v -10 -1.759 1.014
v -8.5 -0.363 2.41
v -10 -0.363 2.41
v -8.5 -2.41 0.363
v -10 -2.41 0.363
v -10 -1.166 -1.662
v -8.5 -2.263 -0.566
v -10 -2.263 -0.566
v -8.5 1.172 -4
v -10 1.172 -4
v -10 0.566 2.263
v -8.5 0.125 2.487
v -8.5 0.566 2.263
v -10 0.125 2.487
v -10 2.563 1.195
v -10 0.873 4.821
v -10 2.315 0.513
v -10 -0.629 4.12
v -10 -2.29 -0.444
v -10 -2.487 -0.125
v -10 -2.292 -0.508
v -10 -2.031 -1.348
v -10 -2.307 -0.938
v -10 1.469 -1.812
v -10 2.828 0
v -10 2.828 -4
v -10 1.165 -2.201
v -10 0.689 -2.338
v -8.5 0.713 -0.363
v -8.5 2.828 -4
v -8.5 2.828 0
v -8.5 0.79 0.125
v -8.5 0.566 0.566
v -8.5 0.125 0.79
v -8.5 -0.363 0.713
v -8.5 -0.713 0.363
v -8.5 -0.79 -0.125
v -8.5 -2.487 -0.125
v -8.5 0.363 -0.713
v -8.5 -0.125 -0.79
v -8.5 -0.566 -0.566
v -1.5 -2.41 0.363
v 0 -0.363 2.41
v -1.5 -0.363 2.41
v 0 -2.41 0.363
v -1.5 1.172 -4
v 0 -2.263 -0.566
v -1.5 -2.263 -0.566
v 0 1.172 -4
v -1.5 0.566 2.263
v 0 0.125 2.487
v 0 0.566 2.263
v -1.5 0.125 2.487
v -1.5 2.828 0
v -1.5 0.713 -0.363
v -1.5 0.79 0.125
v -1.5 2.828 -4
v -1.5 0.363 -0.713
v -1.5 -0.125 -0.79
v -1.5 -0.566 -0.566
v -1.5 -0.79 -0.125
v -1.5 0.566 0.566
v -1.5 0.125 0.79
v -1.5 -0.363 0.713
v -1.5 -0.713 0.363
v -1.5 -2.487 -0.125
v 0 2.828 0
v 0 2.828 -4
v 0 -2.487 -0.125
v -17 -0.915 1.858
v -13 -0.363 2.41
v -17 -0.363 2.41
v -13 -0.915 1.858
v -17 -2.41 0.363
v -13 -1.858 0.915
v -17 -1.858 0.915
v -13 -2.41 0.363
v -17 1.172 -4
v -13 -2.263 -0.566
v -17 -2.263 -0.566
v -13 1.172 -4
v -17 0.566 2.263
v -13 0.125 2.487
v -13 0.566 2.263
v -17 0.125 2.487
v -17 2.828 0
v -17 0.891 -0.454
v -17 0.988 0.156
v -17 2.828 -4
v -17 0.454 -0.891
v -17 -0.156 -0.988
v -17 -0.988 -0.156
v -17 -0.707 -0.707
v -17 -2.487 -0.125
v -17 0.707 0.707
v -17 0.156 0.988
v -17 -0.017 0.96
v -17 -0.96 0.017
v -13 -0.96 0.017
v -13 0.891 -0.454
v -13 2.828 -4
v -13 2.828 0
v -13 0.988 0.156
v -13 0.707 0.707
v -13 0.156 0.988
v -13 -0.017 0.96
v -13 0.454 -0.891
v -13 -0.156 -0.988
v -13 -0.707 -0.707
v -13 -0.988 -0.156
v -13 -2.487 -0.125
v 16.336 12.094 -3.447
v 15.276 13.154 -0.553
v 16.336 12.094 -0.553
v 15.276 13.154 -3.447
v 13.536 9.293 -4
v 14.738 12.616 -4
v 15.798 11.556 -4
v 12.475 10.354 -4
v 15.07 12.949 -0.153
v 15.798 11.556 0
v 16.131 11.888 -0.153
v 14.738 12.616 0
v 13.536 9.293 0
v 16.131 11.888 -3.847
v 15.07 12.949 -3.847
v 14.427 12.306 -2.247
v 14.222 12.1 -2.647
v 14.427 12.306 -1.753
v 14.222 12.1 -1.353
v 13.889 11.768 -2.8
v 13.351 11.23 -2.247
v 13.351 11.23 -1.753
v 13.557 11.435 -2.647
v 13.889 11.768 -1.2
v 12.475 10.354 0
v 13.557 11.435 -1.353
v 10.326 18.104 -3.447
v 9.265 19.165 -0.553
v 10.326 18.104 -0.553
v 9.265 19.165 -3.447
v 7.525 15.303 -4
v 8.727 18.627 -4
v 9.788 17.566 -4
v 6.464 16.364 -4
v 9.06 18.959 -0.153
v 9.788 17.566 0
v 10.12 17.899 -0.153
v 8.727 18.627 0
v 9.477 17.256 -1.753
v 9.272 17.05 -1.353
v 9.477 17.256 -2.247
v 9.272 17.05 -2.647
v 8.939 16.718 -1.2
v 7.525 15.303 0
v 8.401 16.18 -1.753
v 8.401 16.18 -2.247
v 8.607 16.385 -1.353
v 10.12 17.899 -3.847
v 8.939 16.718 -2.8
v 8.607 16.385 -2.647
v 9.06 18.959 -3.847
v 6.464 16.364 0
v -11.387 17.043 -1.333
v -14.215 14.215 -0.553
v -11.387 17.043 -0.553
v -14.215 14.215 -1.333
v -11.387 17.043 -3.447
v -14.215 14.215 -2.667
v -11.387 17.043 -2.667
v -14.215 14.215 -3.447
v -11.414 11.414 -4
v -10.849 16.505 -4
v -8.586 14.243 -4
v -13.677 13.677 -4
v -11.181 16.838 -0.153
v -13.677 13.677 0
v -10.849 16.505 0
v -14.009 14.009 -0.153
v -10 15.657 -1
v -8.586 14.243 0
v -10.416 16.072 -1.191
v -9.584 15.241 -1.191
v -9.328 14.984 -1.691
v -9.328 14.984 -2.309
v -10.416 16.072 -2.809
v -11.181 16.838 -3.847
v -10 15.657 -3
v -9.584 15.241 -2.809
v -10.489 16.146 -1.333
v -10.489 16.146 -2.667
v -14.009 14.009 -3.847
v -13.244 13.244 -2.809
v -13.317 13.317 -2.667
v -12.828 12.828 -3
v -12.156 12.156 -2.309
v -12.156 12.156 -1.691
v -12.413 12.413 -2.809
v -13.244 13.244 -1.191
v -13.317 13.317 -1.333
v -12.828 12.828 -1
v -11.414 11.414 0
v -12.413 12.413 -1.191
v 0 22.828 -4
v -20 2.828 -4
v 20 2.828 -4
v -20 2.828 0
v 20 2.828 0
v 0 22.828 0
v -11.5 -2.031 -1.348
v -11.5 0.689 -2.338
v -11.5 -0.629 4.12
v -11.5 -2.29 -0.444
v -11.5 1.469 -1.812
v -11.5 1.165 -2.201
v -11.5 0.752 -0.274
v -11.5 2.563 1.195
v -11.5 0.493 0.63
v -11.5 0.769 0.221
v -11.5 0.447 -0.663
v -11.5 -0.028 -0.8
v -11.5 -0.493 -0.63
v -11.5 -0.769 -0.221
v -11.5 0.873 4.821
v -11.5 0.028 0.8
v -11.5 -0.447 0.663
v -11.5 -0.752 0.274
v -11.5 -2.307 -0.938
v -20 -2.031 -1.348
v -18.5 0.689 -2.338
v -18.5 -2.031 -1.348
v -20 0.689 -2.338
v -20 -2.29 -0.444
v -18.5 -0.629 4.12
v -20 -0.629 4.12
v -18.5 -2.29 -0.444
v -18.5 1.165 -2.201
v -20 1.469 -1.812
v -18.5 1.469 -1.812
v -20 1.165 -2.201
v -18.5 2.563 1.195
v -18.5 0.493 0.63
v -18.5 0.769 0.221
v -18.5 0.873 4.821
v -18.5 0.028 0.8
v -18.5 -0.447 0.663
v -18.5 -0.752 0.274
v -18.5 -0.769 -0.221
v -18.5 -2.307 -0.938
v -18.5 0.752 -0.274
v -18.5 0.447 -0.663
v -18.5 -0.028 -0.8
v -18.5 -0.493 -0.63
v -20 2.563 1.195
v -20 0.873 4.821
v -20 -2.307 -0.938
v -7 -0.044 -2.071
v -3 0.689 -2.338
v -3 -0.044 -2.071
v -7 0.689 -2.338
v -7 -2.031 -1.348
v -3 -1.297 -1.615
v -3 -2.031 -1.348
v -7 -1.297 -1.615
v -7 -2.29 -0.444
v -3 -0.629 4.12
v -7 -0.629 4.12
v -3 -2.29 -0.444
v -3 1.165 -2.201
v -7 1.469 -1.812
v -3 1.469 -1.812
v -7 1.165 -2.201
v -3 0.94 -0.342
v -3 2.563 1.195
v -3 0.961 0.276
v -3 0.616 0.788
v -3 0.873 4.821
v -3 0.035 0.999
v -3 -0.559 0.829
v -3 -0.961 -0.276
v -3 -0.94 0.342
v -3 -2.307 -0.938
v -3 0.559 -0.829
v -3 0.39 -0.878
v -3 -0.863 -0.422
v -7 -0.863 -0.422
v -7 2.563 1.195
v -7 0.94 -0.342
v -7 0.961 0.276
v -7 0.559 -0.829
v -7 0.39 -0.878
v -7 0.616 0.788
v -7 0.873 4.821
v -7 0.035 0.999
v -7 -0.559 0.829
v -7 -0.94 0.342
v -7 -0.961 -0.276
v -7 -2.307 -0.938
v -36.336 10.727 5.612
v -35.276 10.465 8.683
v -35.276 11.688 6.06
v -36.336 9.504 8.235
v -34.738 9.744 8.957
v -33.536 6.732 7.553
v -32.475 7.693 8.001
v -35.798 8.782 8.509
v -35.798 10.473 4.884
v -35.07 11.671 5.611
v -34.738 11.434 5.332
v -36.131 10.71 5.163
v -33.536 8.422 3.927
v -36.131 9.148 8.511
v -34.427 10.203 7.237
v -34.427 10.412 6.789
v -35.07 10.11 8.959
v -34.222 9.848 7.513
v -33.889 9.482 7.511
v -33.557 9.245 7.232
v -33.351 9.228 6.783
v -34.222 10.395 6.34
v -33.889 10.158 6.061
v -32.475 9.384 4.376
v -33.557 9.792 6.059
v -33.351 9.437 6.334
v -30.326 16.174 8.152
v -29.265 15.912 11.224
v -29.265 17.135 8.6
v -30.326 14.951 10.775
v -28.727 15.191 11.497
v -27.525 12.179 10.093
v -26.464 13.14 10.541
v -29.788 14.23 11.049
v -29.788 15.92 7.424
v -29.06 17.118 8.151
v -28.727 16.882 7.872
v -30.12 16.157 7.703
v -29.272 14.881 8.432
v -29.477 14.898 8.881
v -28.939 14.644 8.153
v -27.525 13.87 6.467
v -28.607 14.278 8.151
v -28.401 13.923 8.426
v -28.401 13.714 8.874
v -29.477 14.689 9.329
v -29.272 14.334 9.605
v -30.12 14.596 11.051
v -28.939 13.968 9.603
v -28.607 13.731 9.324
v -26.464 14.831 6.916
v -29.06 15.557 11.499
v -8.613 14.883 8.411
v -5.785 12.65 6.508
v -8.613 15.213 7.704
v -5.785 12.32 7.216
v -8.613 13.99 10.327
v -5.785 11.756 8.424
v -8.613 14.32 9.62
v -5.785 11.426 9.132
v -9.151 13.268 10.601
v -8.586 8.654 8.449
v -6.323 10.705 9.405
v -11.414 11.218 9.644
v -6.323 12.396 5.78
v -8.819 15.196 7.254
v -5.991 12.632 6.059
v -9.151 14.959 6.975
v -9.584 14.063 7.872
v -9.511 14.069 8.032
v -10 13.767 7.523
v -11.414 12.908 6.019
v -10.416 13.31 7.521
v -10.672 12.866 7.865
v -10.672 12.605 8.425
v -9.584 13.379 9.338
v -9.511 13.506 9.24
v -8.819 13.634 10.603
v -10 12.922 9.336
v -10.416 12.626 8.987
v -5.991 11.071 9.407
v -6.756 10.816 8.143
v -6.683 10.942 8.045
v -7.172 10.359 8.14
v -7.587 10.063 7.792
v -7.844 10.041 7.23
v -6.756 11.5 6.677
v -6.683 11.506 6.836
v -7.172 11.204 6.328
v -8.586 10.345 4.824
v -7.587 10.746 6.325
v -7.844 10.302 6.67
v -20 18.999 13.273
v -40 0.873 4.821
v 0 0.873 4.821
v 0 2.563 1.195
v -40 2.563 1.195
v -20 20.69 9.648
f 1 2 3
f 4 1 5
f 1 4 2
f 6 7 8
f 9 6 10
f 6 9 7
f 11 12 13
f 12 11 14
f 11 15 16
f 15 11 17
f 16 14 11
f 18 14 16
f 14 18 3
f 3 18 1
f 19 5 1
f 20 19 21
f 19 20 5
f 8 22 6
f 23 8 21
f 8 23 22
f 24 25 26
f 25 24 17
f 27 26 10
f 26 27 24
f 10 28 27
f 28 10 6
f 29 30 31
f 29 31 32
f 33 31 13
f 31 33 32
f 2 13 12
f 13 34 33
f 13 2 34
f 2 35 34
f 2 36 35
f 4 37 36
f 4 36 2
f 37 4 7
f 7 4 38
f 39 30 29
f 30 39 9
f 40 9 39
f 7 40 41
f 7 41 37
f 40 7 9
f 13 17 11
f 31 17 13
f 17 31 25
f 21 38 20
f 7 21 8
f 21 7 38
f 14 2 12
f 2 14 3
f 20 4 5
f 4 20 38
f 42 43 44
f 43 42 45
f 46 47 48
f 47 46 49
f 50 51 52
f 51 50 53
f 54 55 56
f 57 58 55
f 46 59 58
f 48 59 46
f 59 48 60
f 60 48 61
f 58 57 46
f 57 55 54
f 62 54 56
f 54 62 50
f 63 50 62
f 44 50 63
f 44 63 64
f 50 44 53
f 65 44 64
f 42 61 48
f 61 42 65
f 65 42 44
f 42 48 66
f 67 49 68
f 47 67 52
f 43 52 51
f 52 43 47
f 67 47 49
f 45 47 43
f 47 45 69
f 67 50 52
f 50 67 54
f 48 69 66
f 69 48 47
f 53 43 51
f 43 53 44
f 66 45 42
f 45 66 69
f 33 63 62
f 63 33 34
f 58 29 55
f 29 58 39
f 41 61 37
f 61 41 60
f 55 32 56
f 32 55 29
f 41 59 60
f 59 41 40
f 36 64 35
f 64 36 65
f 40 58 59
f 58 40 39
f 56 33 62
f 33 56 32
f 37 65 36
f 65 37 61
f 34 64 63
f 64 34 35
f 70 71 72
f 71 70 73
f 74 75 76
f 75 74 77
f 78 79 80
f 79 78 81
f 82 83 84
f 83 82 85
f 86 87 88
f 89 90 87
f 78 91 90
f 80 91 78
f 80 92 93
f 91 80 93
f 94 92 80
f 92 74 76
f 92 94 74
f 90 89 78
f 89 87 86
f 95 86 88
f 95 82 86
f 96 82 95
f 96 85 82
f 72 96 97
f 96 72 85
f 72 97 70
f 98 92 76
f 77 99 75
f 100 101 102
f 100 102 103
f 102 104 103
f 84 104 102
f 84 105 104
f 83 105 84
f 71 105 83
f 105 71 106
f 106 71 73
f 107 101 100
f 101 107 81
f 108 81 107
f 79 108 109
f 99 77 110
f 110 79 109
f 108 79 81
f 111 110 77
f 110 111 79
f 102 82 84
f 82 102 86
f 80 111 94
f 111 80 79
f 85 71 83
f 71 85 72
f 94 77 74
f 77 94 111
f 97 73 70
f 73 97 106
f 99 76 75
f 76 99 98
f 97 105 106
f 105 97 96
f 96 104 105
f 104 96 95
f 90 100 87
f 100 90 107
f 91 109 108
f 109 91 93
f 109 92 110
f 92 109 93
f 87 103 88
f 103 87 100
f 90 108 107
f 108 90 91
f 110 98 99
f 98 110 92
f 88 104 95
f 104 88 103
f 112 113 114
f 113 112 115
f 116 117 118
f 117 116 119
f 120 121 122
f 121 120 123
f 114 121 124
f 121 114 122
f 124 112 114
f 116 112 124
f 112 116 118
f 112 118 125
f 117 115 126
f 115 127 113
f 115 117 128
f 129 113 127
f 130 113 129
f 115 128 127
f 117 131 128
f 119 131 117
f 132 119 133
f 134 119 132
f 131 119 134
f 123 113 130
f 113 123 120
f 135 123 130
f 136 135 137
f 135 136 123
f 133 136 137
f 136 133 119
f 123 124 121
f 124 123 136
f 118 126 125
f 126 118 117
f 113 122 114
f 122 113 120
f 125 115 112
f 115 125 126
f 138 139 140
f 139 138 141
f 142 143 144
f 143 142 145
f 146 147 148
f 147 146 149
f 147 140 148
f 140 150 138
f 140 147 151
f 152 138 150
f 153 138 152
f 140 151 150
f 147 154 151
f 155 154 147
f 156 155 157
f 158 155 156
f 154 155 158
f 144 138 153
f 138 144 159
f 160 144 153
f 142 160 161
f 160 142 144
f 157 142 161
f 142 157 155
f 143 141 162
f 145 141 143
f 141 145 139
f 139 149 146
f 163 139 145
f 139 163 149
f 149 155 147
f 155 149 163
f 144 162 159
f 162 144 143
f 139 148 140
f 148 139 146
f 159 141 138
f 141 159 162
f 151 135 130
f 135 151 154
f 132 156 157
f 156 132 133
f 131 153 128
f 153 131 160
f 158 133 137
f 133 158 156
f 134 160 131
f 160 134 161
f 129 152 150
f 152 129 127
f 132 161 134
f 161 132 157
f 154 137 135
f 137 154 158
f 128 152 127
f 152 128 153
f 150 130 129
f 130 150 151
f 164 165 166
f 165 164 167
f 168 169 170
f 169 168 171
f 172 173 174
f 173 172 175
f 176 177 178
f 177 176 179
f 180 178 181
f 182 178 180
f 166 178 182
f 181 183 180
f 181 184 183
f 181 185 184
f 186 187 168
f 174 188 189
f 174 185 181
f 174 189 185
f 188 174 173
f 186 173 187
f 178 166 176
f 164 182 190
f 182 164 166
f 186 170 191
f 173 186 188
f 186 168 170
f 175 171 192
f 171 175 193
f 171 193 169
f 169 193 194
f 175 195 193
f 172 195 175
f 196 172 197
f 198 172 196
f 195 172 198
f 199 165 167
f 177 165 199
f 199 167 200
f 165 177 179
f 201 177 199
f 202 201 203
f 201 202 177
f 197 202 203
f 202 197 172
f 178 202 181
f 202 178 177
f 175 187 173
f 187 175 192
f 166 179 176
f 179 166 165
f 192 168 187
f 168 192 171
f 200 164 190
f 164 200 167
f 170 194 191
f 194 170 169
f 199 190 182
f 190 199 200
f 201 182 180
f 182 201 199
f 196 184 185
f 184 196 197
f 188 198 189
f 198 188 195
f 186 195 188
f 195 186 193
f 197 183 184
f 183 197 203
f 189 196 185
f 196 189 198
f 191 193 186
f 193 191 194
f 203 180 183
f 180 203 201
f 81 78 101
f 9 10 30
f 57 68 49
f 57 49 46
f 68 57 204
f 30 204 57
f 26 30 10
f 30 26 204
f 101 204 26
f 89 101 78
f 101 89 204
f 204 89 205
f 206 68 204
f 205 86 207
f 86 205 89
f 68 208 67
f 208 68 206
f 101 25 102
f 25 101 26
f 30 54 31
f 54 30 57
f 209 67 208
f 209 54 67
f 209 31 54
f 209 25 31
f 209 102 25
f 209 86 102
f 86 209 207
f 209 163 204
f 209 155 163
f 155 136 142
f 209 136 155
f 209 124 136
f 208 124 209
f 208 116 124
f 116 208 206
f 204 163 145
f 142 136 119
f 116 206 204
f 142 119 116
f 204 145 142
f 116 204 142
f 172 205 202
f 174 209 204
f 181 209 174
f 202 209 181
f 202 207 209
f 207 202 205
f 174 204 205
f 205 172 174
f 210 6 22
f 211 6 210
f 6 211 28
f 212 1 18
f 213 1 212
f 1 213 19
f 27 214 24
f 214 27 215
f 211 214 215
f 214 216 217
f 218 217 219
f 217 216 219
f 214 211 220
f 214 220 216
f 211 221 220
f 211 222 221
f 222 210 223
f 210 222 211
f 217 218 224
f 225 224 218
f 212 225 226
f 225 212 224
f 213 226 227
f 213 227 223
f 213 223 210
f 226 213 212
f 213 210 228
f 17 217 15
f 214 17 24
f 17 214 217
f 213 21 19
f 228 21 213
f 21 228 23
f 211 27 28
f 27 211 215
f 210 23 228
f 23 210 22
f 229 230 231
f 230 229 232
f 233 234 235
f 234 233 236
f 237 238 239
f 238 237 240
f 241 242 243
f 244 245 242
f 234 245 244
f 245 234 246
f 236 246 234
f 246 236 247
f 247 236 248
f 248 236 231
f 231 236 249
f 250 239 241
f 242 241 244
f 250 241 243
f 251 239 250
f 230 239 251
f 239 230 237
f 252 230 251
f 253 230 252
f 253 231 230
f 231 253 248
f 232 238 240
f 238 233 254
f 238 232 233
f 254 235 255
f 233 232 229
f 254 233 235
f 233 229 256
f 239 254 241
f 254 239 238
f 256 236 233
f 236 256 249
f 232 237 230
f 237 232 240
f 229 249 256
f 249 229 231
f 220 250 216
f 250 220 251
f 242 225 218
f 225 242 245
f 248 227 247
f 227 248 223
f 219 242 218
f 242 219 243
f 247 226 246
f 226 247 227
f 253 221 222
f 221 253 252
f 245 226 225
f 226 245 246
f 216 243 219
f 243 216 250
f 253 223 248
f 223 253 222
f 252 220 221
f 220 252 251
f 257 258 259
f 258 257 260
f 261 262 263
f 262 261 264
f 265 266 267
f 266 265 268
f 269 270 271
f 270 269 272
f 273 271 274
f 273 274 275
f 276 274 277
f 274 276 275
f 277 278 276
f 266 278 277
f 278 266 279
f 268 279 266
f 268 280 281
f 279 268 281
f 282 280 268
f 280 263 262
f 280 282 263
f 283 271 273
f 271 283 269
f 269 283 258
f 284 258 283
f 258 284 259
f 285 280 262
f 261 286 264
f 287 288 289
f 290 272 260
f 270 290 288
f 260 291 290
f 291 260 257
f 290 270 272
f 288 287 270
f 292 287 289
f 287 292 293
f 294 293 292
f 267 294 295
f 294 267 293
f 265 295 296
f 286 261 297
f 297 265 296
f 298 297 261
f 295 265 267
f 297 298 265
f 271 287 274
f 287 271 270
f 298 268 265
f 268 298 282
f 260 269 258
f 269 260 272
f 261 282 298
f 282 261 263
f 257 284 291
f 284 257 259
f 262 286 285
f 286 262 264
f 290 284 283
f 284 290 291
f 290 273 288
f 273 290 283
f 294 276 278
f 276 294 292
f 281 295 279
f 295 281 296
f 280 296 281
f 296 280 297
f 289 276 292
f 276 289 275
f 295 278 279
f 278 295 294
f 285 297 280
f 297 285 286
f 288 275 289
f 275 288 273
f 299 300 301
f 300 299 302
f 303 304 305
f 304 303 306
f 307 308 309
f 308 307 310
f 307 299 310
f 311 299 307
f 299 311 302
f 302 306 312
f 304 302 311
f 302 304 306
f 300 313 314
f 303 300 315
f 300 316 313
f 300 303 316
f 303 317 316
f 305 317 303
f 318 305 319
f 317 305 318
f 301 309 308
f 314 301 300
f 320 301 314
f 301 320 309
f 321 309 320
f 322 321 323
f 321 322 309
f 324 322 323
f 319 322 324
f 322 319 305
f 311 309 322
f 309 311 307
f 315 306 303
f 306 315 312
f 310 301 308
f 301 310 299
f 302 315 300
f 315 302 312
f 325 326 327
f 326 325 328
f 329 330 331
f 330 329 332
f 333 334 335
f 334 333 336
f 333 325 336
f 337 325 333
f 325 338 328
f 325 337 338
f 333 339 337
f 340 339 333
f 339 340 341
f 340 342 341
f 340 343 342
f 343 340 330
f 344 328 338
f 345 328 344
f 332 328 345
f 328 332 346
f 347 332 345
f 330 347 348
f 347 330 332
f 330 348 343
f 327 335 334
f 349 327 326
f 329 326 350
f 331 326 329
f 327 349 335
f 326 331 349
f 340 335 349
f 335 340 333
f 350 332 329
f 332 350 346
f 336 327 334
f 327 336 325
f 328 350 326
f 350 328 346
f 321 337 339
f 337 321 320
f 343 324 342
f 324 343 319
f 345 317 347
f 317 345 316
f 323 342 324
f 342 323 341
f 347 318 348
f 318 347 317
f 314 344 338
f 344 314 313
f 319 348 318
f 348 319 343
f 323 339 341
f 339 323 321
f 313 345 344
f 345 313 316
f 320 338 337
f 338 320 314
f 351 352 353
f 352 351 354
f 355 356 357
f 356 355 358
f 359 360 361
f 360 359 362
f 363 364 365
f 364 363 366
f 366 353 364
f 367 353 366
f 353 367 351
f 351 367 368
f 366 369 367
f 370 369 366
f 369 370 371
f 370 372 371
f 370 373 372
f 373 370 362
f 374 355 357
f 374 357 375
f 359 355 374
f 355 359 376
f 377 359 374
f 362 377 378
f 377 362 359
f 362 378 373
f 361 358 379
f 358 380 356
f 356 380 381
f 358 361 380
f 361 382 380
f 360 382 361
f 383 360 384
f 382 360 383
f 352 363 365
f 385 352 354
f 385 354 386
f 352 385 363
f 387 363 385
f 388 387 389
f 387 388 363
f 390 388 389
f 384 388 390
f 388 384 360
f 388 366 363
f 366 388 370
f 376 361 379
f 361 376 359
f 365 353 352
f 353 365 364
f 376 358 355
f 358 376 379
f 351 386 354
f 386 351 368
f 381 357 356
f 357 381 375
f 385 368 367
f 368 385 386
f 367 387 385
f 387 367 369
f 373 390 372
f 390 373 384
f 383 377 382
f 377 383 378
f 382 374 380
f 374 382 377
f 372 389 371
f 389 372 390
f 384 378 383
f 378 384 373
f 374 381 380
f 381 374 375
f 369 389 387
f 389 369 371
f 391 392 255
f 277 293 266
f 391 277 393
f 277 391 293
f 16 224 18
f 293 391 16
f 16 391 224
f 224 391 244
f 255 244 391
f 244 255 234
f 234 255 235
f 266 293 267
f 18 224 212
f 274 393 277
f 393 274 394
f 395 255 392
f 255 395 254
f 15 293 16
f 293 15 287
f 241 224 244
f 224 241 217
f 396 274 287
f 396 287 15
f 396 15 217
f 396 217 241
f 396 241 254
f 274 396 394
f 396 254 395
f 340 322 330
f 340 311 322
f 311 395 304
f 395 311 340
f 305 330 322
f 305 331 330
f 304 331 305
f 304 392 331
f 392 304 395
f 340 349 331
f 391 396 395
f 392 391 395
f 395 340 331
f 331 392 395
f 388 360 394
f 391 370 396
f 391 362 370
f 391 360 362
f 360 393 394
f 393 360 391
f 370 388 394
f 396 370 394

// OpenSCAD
// file: clip.scad
include <vars.scad>;

module clip(){
  width = TRIANGLE_SIDE/4;
  size = TRIANGLE_THICKNESS;
  corner = 0.8;
    
  difference() {
    hull() {
      translate([0, size, 0]) {
        cube([size, size, size], center=true);
      }
      translate([0, -size/2+corner, size/2-corner]) {
        rotate(90, [0,1,0]) {
          cylinder(h=size, r=corner, center=true);
        }
      }
      translate([0, -size/2+corner, -size/2+corner]) {
        rotate(90, [0,1,0]) {
          cylinder(h=size, r=corner, center=true);
        }
      }
    }
    translate([0, -size/2, 0]) {
      cube([width*0.9, size, size/3], center=true);
    }
    rotate(90, [0,1,0]) {
      cylinder(h=width*0.9, r=size/2*1/2, center=true);
    }
  }
}

clip();
// file: hinge.scad
include <vars.scad>;

module hinge(){
  width = TRIANGLE_SIDE/4;
  size = TRIANGLE_THICKNESS;
  side = width/6*0.9;
  corner = 0.8;
    
  hull() {
    translate([-(width/2)+side/2, side*2, 0]) {
      cube([side, size, size], center=true);
    }
    translate([-(width/2)+side/2, -size/2+corner, size/2-corner]) {
      rotate(90, [0,1,0]) {
        cylinder(h=side, r=corner, center=true);
      }
    }
    translate([-(width/2)+side/2, -size/2+corner, -size/2+corner]) {
      rotate(90, [0,1,0]) {
        cylinder(h=side, r=corner, center=true);
      }
    }
  }
  hull() {
    translate([width/2-side/2, side*2, 0]) {
      cube([side, size, size], center=true);
    } 
    translate([width/2-side/2, -size/2+corner, size/2-corner]) {
      rotate(90, [0,1,0]) {
        cylinder(h=side, r=corner, center=true);
      }
    }
    translate([width/2-side/2, -size/2+corner, -size/2+corner]) {
      rotate(90, [0,1,0]) {
        cylinder(h=side, r=corner, center=true);
      }
    }
  }
  rotate(90, [0,1,0]) {
    cylinder(h=width, r=size/2*0.8/2, center=true);
  }
} 

hinge();
// file: triangle.scad
include <vars.scad>;

module triangle(){
  translate([0, 0, -TRIANGLE_THICKNESS/2]) {
    linear_extrude(TRIANGLE_THICKNESS) {
      polygon([[-TRIANGLE_SIDE/2, -TRIANGLE_SIDE/4], [0, TRIANGLE_SIDE/4], [TRIANGLE_SIDE/2, -TRIANGLE_SIDE/4]]);
    }
  }
}

triangle();
// file: part.scad
include <vars.scad>;
use <triangle.scad>;
use <hinge.scad>;
use <clip.scad>;

module part() {
  difference() {
    union(){
      triangle();
      translate([-TRIANGLE_SIDE/8, -TRIANGLE_SIDE/4, 0]) {
        translate([0, 0, TRIANGLE_THICKNESS/2]) {
          rotate(-45, [1, 0, 0]) {
            translate([0, -TRIANGLE_THICKNESS/2, -TRIANGLE_THICKNESS/2]) {
              hinge();
            }
          }
        }
      }
      translate([-TRIANGLE_SIDE/8*3, -TRIANGLE_SIDE/4, 0]) {
        translate([0, 0, TRIANGLE_THICKNESS/2]) {
          rotate(-45, [1, 0, 0]) {
            translate([0, -TRIANGLE_THICKNESS/2, -TRIANGLE_THICKNESS/2]) {
              clip();
            }
          }
        }
      }
      translate([TRIANGLE_SIDE/4, 0, 0]) {
        rotate(135, [0, 0, 1]) {
          translate([0, -TRIANGLE_THICKNESS/2, 0]) {
            hinge();
          }
        }
      }
      translate([-TRIANGLE_SIDE/4, 0, 0]) {
        rotate(-135, [0, 0, 1]) {
          translate([0, -TRIANGLE_THICKNESS/2, 0]) {
            clip();
          }
        }
      }
    }
    translate([0, 0, -TRIANGLE_THICKNESS]) {
      cube([TRIANGLE_SIDE*2, TRIANGLE_SIDE*2, TRIANGLE_THICKNESS], center=true);
    }
  }
}

part();
// file: vars.scad
$fn = 10;
TRIANGLE_SIDE = 40; // Triangle side size
TRIANGLE_THICKNESS = 4; // Triagle thickness
// main file
include <vars.scad>;
use <part.scad>;

module assembly() {
  function pitagor(a, b) = sqrt(pow(a, 2) + pow(b, 2));

  translate([0, TRIANGLE_SIDE/2/2 + pitagor(TRIANGLE_THICKNESS, TRIANGLE_THICKNESS) / 2, -TRIANGLE_THICKNESS/2]) {
    part();
  }

  rotate(25, [1,0,0]) {
    translate([-TRIANGLE_SIDE/2, TRIANGLE_SIDE/2/2 + pitagor(TRIANGLE_THICKNESS, TRIANGLE_THICKNESS) / 2, TRIANGLE_THICKNESS/2]) {
      rotate(180, [0,0,1]) {
        rotate(180, [1,0,0]) {
          part();
        }
      }
    }
  }
}

assembly();
